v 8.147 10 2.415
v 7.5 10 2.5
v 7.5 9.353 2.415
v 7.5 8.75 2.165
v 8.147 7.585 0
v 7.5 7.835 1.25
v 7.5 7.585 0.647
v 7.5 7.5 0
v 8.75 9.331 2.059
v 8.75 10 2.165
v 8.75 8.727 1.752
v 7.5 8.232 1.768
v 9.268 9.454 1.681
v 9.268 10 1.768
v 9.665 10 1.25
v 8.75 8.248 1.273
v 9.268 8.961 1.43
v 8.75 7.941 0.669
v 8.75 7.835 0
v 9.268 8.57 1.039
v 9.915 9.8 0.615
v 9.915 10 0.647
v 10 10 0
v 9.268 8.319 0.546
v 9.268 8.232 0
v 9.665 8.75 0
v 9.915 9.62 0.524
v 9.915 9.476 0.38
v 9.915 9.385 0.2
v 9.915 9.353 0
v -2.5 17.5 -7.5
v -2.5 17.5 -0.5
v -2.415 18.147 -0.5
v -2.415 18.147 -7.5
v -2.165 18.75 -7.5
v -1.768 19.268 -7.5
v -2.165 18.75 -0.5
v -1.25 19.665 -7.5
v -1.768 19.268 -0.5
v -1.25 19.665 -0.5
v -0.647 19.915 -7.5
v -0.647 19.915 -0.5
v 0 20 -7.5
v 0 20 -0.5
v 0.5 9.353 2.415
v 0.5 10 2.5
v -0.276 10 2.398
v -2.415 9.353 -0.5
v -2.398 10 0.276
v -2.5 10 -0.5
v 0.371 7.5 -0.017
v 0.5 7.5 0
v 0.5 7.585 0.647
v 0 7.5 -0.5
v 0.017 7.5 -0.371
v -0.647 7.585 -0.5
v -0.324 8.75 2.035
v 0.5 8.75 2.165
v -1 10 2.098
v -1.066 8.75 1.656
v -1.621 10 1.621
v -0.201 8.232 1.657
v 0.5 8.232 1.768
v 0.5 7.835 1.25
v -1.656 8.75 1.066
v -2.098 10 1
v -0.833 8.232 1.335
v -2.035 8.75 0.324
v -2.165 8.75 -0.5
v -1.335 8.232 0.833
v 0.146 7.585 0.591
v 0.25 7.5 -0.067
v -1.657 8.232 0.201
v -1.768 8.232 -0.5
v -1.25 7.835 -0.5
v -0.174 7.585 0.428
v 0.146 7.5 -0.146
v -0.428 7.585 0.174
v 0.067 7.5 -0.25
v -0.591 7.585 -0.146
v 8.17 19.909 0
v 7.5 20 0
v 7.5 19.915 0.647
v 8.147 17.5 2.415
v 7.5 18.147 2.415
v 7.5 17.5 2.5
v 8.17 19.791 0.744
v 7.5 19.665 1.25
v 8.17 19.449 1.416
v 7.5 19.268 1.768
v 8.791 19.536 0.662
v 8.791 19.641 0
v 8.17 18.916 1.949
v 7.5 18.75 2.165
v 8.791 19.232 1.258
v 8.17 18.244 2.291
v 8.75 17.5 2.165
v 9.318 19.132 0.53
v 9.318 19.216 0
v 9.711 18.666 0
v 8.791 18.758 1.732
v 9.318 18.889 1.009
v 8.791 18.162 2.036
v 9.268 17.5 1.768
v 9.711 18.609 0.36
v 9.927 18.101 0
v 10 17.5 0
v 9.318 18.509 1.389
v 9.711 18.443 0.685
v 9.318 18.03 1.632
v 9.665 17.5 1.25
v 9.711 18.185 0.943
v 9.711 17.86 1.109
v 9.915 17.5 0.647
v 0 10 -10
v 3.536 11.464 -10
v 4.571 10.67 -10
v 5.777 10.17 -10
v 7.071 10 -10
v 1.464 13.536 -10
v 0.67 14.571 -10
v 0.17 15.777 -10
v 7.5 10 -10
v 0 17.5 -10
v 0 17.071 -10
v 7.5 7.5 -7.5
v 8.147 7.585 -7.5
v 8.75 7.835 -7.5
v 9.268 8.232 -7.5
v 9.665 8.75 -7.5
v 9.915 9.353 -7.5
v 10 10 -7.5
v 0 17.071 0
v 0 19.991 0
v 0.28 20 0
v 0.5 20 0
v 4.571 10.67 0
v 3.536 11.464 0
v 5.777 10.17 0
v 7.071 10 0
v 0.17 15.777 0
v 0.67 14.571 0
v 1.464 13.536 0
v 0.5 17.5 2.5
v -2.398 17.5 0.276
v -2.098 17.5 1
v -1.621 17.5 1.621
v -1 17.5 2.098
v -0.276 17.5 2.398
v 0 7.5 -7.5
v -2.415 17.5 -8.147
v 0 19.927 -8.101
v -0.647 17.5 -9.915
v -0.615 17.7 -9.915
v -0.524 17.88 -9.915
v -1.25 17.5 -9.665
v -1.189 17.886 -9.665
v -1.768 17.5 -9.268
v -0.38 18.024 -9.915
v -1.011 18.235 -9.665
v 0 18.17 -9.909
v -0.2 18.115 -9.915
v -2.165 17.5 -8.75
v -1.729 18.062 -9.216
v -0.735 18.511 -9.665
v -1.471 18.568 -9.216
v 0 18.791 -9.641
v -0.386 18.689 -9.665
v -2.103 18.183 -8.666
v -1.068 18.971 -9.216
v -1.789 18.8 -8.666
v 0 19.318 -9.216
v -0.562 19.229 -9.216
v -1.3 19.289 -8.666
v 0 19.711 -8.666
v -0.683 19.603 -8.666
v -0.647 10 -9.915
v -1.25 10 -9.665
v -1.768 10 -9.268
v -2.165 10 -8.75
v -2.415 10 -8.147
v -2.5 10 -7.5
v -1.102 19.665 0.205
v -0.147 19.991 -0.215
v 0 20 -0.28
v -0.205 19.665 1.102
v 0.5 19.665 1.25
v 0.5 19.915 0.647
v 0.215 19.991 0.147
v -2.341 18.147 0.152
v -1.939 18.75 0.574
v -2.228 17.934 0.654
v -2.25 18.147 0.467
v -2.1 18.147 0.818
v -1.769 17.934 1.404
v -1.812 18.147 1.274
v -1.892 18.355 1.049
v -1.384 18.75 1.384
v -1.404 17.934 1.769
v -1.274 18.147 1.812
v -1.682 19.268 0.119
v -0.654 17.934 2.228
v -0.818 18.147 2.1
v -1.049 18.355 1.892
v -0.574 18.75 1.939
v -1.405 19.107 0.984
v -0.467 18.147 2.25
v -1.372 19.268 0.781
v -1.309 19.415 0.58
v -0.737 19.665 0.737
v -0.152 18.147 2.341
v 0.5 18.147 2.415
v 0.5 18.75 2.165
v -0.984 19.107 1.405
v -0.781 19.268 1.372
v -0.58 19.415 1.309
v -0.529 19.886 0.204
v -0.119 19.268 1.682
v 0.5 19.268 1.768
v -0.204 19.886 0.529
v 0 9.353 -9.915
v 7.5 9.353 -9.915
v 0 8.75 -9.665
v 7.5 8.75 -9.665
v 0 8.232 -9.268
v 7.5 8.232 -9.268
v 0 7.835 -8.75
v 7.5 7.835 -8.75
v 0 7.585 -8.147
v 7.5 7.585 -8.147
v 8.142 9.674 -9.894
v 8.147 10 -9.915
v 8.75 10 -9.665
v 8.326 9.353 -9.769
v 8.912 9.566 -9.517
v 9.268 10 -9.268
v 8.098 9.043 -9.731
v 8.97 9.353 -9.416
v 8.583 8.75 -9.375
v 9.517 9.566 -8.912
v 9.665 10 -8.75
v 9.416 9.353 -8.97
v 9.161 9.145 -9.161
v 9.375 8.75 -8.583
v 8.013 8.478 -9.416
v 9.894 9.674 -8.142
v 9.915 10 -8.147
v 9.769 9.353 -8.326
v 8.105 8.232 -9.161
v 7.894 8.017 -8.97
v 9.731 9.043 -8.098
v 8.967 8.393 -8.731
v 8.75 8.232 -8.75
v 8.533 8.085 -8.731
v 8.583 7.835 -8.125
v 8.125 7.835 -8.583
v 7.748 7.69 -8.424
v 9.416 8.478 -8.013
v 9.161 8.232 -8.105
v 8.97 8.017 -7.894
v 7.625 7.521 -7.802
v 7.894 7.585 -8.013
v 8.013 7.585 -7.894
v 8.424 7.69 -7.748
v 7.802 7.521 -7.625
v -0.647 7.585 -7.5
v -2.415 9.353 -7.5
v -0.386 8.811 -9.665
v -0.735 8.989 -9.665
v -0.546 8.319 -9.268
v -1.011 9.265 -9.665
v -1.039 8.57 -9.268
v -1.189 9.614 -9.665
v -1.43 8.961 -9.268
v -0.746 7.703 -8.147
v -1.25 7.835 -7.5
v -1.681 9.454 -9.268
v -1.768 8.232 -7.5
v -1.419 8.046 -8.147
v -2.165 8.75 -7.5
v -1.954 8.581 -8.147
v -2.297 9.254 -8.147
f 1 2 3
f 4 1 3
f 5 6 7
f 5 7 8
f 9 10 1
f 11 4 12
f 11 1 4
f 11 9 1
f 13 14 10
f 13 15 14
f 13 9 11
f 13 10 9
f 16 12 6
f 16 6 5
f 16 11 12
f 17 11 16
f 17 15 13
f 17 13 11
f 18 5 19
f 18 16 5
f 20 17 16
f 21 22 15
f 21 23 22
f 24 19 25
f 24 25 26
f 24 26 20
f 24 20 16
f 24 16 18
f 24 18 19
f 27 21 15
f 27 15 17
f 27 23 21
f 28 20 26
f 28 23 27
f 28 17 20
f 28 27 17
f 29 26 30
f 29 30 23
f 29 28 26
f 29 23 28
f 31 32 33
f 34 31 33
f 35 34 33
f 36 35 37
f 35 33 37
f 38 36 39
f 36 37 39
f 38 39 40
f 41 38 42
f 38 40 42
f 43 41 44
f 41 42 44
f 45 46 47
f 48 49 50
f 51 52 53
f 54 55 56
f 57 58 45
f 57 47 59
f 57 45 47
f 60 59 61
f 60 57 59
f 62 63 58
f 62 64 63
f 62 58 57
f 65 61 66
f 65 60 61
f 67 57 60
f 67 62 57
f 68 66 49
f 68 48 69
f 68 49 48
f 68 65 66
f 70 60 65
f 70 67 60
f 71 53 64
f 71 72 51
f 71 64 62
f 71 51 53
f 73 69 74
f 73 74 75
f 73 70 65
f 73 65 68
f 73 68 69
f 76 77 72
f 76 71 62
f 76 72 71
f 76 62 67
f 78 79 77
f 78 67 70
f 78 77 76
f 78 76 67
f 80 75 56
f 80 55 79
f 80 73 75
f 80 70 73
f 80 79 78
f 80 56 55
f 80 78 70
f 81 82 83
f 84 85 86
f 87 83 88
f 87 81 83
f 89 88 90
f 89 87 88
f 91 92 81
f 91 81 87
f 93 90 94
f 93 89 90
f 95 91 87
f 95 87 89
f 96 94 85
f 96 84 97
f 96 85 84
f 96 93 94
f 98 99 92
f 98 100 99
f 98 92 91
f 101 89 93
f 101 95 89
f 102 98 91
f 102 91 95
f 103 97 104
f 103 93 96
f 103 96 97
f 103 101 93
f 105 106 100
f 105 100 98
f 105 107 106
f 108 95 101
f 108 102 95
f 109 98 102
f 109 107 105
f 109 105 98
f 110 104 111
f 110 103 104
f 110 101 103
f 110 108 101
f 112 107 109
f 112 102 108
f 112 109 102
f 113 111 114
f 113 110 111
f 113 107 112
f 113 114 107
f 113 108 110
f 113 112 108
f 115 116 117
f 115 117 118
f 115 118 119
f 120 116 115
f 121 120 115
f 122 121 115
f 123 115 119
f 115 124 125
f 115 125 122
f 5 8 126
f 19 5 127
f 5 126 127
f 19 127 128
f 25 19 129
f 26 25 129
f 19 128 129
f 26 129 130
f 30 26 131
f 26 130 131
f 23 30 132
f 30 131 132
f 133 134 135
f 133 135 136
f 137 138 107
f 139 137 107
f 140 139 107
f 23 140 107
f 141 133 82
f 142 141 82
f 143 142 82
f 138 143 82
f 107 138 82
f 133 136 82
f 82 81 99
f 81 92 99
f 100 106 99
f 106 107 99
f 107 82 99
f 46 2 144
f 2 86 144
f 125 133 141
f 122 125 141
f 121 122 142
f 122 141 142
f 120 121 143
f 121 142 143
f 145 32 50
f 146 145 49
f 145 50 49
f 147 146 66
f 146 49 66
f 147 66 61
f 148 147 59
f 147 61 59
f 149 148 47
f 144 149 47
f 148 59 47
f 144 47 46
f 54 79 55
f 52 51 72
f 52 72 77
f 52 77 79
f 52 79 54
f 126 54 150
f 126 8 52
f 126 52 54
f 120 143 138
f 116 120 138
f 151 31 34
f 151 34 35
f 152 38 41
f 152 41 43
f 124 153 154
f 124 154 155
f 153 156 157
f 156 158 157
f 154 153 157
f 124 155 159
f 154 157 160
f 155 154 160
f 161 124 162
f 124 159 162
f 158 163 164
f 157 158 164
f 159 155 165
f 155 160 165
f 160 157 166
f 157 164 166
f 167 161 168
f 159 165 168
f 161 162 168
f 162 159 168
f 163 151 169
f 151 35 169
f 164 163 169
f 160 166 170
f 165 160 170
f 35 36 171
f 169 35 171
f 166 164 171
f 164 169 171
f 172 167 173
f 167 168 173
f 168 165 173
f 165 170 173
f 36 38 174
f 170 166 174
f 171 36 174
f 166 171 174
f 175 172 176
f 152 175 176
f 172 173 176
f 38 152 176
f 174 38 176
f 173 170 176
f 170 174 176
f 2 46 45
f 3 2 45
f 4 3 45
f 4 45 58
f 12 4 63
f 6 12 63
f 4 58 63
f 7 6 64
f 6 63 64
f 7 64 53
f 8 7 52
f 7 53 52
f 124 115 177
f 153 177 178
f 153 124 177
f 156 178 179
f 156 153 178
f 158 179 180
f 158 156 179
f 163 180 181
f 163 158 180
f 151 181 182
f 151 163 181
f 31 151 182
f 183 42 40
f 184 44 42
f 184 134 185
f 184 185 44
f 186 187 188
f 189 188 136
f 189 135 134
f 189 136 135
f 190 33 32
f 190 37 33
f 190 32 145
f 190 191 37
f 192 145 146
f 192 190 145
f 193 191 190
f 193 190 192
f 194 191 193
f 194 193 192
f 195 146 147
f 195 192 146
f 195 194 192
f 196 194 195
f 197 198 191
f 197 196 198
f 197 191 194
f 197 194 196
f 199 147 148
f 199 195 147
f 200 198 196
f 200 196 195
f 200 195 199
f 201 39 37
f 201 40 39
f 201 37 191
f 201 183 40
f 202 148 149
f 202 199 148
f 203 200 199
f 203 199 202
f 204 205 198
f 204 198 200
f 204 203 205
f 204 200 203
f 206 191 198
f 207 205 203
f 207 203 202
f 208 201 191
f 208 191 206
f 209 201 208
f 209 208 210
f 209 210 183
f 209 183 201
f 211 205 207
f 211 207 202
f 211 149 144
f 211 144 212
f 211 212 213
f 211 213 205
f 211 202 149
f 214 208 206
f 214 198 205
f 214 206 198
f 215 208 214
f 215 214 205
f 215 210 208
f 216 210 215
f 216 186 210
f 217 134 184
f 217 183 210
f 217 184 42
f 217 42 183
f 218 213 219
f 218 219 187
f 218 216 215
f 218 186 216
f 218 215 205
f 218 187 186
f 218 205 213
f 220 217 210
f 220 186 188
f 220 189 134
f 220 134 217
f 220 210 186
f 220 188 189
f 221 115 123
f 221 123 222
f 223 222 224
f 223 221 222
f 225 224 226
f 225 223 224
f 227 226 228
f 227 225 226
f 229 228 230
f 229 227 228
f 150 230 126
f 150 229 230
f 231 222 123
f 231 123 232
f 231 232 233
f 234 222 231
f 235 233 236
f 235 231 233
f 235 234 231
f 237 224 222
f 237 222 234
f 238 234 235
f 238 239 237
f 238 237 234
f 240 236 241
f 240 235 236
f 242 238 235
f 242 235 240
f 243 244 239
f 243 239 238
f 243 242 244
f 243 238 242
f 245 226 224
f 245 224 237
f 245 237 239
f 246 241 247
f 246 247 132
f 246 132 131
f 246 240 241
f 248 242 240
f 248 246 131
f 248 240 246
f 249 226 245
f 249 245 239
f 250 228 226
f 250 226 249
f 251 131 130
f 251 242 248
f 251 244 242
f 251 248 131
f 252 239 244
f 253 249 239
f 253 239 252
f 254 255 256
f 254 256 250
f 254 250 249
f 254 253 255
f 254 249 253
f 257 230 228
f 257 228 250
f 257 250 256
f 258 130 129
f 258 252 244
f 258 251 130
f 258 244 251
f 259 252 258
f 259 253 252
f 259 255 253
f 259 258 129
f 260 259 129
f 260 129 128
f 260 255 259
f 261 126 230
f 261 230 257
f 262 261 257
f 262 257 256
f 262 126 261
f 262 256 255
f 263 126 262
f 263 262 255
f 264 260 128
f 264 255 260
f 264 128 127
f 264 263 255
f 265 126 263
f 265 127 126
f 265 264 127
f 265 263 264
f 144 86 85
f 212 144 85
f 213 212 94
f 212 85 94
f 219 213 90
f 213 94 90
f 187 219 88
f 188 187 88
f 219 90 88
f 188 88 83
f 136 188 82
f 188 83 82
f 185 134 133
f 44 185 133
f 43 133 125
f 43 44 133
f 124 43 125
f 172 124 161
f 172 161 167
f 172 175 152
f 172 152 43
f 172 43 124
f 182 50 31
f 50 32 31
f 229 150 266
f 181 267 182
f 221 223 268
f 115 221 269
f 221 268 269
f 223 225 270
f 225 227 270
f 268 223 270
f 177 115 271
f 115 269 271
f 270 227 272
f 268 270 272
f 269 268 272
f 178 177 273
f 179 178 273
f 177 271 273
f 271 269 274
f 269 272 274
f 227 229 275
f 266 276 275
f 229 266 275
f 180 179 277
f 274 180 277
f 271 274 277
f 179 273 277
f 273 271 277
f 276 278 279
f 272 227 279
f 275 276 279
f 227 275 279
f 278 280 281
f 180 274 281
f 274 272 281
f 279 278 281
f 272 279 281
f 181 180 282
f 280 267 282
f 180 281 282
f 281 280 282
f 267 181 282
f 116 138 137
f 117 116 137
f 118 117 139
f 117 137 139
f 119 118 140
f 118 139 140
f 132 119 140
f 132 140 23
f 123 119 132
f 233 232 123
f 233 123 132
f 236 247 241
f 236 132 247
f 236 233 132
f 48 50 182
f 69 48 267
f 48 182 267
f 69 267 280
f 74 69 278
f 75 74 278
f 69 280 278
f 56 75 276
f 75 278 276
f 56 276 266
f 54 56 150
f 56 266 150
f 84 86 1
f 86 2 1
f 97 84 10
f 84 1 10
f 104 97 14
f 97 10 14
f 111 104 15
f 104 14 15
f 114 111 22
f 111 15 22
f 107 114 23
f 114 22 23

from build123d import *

# Parameters (mm, degrees)
SKETCH1_W           = 10
SKETCH1_H           = 10
BOSS_EXTRUDE1_DEPTH = 20
SKETCH2_W           = 20
SKETCH2_H           = 20
CUT_EXTRUDE1_DEPTH  = 10
BOSS_EXTRUDE2_DEPTH = 10
CUT_EXTRUDE2_DEPTH  = 25
SKETCH5_W           = 12.5
SKETCH5_H           = 7.5
CUT_EXTRUDE3_DEPTH  = 25
FILLET6_R           = 3
FILLET7_R           = 2.5
FILLET8_R           = 2.5
FILLET9_R           = 2.5
FILLET10_R          = 2.5


# Some blends are built 0.0001 mm under size
with BuildPart() as part:
    # Sketch1 → Boss-Extrude1 (new body)
    with BuildSketch(Plane(origin=(0, 0, 0), x_dir=(1, 0, 0), z_dir=(0, 1, 0))):
        Polygon((0, 10), (-10, 10), (-10, -10), (10, -10), (10, 0), (0, 0), align=None)
        with Locations((5, 5)):
            Rectangle(SKETCH1_W, SKETCH1_H)
    extrude(amount=BOSS_EXTRUDE1_DEPTH)

    # Sketch2 → Cut-Extrude1 (cut)
    with BuildSketch(Plane(origin=(0, 20, 0), x_dir=(1, 0, 0), z_dir=(0, 1, 0))):
        with Locations((10, 10)):
            Rectangle(SKETCH2_W, SKETCH2_H)
    extrude(amount=-CUT_EXTRUDE1_DEPTH, mode=Mode.SUBTRACT)

    # Sketch3 → Boss-Extrude2 (add)
    with BuildSketch(Plane(origin=(0, 0, 0), x_dir=(-1, 0, 0), z_dir=(0, 0, -1))):
        with BuildLine():
            Line((-1.464466094, 13.535533906), (-3.535533906, 11.464466094))
            ThreePointArc((-3.535533906, 11.464466094), (-5.15765065, 10.380602337), (-7.071067812, 10))
            Line((-7.071067812, 10), (0, 10))
            Line((0, 10), (0, 17.071067812))
            ThreePointArc((0, 17.071067812), (-0.380602337, 15.15765065), (-1.464466094, 13.535533906))
        make_face()
    extrude(amount=BOSS_EXTRUDE2_DEPTH)

    # Sketch4 → Cut-Extrude2 (cut)
    with BuildSketch(Plane(origin=(0, 20, 0), x_dir=(1, 0, 0), z_dir=(0, 1, 0))):
        Polygon((-2.5, -2.5), (-2.5, 10), (-10, 10), (-10, -10), (10, -10), (10, -2.5), align=None)
    extrude(amount=-CUT_EXTRUDE2_DEPTH, mode=Mode.SUBTRACT)

    # Sketch5 → Cut-Extrude3 (cut)
    with BuildSketch(Plane(origin=(10, 0, 0), x_dir=(0, 0, -1), z_dir=(1, 0, 0))):
        with Locations((3.75, 3.75)):
            Rectangle(SKETCH5_W, SKETCH5_H)
    extrude(amount=-CUT_EXTRUDE3_DEPTH, mode=Mode.SUBTRACT)

    # Fillet6
    fillet6_edges = [part.edges().sort_by_distance(p)[0] for p in [
        (-2.5, 13.75, 2.5),
    ]]
    fillet(fillet6_edges, radius=FILLET6_R)

    # Fillet7
    # the kernel refuses this fillet: 2.5 mm, written as the material it takes off along each edge
    with BuildSketch(Plane(origin=(16.25, 20, 2.5), x_dir=(0, 0, -1), z_dir=(-1, 0, 0)), Plane(origin=(-2.5, 20, -0.5), x_dir=(1, 0, 0), z_dir=(0, 0, -1))) as fillet7_piece_1:
        with BuildLine():
            CenterArc((FILLET7_R, FILLET7_R), FILLET7_R, 180, 90)
            Line((0, FILLET7_R), (0, 0))
            Line((0, 0), (FILLET7_R, 0))
        make_face()
    extrude(amount=15.75, mode=Mode.SUBTRACT)
    with BuildSketch(Plane(origin=(0.5, 20, -0.5), x_dir=(-1, 0, 0), z_dir=(0, 0, -1))) as fillet7_piece_2:
        with BuildLine():
            CenterArc((3 - FILLET7_R, -FILLET7_R), FILLET7_R, 0, 90)
            Line((3, -FILLET7_R), (3, 0))
            Line((3, 0), (3 - FILLET7_R, 0))
        make_face()
    revolve(axis=Axis((0.5, 20, -0.5), (0, 1, 0)), revolution_arc=90, mode=Mode.SUBTRACT)

    # Fillet8
    fillet8_edges = [part.edges().sort_by_distance(p)[0] for p in [
        (-2.5, 7.5, -5.25),
        (5.25, 7.5, 2.5),
        (-1.621320344, 7.5, 1.621320344),
    ]]
    fillet(fillet8_edges, radius=FILLET8_R)

    # Fillet9
    fillet9_edges = [part.edges().sort_by_distance(p)[0] for p in [
        (5, 7.5, -10),
        (-1.767766953, 19.267766953, -10),
        (-2.5, 13.75, -10),
        (10, 19.267766953, 1.767766953),
        (10, 13.75, 2.5),
        (10, 7.5, -5),
        (-1.767766953, 8.232233047, -10),
        (10, 8.232233047, 1.767766953),
    ]]
    fillet(fillet9_edges, radius=FILLET9_R - 0.0001)  # a hair under: the kernel refuses the full size

    # Fillet10
    # the kernel refuses this fillet: 2.5 mm, written as the material it takes off along each edge
    with BuildSketch(Plane(origin=(7.5, 7.5, -7.5), x_dir=(0, 0, -1), z_dir=(-1, 0, 0))) as fillet10_piece_1:
        with BuildLine():
            CenterArc((0.0001, -2.4999), 2.4999, 0, 90)
            Line((2.5, -2.4999), (2.5, 0))
            Line((2.5, 0), (0.0001, 0))
        make_face()
    revolve(axis=Axis((7.5, 7.5, -7.5), (0, -1, 0)), revolution_arc=90, mode=Mode.SUBTRACT)
    with BuildSketch(Plane(origin=(10, 7.5, -10), x_dir=(-1, 0, 0), z_dir=(0, 1, 0))) as fillet10_piece_2:
        with BuildLine():
            CenterArc((FILLET10_R, FILLET10_R), FILLET10_R, 180, 90)
            Line((0, FILLET10_R), (0, 0))
            Line((0, 0), (FILLET10_R, 0))
        make_face()
    extrude(amount=8.75, mode=Mode.SUBTRACT)


solid = part.part
